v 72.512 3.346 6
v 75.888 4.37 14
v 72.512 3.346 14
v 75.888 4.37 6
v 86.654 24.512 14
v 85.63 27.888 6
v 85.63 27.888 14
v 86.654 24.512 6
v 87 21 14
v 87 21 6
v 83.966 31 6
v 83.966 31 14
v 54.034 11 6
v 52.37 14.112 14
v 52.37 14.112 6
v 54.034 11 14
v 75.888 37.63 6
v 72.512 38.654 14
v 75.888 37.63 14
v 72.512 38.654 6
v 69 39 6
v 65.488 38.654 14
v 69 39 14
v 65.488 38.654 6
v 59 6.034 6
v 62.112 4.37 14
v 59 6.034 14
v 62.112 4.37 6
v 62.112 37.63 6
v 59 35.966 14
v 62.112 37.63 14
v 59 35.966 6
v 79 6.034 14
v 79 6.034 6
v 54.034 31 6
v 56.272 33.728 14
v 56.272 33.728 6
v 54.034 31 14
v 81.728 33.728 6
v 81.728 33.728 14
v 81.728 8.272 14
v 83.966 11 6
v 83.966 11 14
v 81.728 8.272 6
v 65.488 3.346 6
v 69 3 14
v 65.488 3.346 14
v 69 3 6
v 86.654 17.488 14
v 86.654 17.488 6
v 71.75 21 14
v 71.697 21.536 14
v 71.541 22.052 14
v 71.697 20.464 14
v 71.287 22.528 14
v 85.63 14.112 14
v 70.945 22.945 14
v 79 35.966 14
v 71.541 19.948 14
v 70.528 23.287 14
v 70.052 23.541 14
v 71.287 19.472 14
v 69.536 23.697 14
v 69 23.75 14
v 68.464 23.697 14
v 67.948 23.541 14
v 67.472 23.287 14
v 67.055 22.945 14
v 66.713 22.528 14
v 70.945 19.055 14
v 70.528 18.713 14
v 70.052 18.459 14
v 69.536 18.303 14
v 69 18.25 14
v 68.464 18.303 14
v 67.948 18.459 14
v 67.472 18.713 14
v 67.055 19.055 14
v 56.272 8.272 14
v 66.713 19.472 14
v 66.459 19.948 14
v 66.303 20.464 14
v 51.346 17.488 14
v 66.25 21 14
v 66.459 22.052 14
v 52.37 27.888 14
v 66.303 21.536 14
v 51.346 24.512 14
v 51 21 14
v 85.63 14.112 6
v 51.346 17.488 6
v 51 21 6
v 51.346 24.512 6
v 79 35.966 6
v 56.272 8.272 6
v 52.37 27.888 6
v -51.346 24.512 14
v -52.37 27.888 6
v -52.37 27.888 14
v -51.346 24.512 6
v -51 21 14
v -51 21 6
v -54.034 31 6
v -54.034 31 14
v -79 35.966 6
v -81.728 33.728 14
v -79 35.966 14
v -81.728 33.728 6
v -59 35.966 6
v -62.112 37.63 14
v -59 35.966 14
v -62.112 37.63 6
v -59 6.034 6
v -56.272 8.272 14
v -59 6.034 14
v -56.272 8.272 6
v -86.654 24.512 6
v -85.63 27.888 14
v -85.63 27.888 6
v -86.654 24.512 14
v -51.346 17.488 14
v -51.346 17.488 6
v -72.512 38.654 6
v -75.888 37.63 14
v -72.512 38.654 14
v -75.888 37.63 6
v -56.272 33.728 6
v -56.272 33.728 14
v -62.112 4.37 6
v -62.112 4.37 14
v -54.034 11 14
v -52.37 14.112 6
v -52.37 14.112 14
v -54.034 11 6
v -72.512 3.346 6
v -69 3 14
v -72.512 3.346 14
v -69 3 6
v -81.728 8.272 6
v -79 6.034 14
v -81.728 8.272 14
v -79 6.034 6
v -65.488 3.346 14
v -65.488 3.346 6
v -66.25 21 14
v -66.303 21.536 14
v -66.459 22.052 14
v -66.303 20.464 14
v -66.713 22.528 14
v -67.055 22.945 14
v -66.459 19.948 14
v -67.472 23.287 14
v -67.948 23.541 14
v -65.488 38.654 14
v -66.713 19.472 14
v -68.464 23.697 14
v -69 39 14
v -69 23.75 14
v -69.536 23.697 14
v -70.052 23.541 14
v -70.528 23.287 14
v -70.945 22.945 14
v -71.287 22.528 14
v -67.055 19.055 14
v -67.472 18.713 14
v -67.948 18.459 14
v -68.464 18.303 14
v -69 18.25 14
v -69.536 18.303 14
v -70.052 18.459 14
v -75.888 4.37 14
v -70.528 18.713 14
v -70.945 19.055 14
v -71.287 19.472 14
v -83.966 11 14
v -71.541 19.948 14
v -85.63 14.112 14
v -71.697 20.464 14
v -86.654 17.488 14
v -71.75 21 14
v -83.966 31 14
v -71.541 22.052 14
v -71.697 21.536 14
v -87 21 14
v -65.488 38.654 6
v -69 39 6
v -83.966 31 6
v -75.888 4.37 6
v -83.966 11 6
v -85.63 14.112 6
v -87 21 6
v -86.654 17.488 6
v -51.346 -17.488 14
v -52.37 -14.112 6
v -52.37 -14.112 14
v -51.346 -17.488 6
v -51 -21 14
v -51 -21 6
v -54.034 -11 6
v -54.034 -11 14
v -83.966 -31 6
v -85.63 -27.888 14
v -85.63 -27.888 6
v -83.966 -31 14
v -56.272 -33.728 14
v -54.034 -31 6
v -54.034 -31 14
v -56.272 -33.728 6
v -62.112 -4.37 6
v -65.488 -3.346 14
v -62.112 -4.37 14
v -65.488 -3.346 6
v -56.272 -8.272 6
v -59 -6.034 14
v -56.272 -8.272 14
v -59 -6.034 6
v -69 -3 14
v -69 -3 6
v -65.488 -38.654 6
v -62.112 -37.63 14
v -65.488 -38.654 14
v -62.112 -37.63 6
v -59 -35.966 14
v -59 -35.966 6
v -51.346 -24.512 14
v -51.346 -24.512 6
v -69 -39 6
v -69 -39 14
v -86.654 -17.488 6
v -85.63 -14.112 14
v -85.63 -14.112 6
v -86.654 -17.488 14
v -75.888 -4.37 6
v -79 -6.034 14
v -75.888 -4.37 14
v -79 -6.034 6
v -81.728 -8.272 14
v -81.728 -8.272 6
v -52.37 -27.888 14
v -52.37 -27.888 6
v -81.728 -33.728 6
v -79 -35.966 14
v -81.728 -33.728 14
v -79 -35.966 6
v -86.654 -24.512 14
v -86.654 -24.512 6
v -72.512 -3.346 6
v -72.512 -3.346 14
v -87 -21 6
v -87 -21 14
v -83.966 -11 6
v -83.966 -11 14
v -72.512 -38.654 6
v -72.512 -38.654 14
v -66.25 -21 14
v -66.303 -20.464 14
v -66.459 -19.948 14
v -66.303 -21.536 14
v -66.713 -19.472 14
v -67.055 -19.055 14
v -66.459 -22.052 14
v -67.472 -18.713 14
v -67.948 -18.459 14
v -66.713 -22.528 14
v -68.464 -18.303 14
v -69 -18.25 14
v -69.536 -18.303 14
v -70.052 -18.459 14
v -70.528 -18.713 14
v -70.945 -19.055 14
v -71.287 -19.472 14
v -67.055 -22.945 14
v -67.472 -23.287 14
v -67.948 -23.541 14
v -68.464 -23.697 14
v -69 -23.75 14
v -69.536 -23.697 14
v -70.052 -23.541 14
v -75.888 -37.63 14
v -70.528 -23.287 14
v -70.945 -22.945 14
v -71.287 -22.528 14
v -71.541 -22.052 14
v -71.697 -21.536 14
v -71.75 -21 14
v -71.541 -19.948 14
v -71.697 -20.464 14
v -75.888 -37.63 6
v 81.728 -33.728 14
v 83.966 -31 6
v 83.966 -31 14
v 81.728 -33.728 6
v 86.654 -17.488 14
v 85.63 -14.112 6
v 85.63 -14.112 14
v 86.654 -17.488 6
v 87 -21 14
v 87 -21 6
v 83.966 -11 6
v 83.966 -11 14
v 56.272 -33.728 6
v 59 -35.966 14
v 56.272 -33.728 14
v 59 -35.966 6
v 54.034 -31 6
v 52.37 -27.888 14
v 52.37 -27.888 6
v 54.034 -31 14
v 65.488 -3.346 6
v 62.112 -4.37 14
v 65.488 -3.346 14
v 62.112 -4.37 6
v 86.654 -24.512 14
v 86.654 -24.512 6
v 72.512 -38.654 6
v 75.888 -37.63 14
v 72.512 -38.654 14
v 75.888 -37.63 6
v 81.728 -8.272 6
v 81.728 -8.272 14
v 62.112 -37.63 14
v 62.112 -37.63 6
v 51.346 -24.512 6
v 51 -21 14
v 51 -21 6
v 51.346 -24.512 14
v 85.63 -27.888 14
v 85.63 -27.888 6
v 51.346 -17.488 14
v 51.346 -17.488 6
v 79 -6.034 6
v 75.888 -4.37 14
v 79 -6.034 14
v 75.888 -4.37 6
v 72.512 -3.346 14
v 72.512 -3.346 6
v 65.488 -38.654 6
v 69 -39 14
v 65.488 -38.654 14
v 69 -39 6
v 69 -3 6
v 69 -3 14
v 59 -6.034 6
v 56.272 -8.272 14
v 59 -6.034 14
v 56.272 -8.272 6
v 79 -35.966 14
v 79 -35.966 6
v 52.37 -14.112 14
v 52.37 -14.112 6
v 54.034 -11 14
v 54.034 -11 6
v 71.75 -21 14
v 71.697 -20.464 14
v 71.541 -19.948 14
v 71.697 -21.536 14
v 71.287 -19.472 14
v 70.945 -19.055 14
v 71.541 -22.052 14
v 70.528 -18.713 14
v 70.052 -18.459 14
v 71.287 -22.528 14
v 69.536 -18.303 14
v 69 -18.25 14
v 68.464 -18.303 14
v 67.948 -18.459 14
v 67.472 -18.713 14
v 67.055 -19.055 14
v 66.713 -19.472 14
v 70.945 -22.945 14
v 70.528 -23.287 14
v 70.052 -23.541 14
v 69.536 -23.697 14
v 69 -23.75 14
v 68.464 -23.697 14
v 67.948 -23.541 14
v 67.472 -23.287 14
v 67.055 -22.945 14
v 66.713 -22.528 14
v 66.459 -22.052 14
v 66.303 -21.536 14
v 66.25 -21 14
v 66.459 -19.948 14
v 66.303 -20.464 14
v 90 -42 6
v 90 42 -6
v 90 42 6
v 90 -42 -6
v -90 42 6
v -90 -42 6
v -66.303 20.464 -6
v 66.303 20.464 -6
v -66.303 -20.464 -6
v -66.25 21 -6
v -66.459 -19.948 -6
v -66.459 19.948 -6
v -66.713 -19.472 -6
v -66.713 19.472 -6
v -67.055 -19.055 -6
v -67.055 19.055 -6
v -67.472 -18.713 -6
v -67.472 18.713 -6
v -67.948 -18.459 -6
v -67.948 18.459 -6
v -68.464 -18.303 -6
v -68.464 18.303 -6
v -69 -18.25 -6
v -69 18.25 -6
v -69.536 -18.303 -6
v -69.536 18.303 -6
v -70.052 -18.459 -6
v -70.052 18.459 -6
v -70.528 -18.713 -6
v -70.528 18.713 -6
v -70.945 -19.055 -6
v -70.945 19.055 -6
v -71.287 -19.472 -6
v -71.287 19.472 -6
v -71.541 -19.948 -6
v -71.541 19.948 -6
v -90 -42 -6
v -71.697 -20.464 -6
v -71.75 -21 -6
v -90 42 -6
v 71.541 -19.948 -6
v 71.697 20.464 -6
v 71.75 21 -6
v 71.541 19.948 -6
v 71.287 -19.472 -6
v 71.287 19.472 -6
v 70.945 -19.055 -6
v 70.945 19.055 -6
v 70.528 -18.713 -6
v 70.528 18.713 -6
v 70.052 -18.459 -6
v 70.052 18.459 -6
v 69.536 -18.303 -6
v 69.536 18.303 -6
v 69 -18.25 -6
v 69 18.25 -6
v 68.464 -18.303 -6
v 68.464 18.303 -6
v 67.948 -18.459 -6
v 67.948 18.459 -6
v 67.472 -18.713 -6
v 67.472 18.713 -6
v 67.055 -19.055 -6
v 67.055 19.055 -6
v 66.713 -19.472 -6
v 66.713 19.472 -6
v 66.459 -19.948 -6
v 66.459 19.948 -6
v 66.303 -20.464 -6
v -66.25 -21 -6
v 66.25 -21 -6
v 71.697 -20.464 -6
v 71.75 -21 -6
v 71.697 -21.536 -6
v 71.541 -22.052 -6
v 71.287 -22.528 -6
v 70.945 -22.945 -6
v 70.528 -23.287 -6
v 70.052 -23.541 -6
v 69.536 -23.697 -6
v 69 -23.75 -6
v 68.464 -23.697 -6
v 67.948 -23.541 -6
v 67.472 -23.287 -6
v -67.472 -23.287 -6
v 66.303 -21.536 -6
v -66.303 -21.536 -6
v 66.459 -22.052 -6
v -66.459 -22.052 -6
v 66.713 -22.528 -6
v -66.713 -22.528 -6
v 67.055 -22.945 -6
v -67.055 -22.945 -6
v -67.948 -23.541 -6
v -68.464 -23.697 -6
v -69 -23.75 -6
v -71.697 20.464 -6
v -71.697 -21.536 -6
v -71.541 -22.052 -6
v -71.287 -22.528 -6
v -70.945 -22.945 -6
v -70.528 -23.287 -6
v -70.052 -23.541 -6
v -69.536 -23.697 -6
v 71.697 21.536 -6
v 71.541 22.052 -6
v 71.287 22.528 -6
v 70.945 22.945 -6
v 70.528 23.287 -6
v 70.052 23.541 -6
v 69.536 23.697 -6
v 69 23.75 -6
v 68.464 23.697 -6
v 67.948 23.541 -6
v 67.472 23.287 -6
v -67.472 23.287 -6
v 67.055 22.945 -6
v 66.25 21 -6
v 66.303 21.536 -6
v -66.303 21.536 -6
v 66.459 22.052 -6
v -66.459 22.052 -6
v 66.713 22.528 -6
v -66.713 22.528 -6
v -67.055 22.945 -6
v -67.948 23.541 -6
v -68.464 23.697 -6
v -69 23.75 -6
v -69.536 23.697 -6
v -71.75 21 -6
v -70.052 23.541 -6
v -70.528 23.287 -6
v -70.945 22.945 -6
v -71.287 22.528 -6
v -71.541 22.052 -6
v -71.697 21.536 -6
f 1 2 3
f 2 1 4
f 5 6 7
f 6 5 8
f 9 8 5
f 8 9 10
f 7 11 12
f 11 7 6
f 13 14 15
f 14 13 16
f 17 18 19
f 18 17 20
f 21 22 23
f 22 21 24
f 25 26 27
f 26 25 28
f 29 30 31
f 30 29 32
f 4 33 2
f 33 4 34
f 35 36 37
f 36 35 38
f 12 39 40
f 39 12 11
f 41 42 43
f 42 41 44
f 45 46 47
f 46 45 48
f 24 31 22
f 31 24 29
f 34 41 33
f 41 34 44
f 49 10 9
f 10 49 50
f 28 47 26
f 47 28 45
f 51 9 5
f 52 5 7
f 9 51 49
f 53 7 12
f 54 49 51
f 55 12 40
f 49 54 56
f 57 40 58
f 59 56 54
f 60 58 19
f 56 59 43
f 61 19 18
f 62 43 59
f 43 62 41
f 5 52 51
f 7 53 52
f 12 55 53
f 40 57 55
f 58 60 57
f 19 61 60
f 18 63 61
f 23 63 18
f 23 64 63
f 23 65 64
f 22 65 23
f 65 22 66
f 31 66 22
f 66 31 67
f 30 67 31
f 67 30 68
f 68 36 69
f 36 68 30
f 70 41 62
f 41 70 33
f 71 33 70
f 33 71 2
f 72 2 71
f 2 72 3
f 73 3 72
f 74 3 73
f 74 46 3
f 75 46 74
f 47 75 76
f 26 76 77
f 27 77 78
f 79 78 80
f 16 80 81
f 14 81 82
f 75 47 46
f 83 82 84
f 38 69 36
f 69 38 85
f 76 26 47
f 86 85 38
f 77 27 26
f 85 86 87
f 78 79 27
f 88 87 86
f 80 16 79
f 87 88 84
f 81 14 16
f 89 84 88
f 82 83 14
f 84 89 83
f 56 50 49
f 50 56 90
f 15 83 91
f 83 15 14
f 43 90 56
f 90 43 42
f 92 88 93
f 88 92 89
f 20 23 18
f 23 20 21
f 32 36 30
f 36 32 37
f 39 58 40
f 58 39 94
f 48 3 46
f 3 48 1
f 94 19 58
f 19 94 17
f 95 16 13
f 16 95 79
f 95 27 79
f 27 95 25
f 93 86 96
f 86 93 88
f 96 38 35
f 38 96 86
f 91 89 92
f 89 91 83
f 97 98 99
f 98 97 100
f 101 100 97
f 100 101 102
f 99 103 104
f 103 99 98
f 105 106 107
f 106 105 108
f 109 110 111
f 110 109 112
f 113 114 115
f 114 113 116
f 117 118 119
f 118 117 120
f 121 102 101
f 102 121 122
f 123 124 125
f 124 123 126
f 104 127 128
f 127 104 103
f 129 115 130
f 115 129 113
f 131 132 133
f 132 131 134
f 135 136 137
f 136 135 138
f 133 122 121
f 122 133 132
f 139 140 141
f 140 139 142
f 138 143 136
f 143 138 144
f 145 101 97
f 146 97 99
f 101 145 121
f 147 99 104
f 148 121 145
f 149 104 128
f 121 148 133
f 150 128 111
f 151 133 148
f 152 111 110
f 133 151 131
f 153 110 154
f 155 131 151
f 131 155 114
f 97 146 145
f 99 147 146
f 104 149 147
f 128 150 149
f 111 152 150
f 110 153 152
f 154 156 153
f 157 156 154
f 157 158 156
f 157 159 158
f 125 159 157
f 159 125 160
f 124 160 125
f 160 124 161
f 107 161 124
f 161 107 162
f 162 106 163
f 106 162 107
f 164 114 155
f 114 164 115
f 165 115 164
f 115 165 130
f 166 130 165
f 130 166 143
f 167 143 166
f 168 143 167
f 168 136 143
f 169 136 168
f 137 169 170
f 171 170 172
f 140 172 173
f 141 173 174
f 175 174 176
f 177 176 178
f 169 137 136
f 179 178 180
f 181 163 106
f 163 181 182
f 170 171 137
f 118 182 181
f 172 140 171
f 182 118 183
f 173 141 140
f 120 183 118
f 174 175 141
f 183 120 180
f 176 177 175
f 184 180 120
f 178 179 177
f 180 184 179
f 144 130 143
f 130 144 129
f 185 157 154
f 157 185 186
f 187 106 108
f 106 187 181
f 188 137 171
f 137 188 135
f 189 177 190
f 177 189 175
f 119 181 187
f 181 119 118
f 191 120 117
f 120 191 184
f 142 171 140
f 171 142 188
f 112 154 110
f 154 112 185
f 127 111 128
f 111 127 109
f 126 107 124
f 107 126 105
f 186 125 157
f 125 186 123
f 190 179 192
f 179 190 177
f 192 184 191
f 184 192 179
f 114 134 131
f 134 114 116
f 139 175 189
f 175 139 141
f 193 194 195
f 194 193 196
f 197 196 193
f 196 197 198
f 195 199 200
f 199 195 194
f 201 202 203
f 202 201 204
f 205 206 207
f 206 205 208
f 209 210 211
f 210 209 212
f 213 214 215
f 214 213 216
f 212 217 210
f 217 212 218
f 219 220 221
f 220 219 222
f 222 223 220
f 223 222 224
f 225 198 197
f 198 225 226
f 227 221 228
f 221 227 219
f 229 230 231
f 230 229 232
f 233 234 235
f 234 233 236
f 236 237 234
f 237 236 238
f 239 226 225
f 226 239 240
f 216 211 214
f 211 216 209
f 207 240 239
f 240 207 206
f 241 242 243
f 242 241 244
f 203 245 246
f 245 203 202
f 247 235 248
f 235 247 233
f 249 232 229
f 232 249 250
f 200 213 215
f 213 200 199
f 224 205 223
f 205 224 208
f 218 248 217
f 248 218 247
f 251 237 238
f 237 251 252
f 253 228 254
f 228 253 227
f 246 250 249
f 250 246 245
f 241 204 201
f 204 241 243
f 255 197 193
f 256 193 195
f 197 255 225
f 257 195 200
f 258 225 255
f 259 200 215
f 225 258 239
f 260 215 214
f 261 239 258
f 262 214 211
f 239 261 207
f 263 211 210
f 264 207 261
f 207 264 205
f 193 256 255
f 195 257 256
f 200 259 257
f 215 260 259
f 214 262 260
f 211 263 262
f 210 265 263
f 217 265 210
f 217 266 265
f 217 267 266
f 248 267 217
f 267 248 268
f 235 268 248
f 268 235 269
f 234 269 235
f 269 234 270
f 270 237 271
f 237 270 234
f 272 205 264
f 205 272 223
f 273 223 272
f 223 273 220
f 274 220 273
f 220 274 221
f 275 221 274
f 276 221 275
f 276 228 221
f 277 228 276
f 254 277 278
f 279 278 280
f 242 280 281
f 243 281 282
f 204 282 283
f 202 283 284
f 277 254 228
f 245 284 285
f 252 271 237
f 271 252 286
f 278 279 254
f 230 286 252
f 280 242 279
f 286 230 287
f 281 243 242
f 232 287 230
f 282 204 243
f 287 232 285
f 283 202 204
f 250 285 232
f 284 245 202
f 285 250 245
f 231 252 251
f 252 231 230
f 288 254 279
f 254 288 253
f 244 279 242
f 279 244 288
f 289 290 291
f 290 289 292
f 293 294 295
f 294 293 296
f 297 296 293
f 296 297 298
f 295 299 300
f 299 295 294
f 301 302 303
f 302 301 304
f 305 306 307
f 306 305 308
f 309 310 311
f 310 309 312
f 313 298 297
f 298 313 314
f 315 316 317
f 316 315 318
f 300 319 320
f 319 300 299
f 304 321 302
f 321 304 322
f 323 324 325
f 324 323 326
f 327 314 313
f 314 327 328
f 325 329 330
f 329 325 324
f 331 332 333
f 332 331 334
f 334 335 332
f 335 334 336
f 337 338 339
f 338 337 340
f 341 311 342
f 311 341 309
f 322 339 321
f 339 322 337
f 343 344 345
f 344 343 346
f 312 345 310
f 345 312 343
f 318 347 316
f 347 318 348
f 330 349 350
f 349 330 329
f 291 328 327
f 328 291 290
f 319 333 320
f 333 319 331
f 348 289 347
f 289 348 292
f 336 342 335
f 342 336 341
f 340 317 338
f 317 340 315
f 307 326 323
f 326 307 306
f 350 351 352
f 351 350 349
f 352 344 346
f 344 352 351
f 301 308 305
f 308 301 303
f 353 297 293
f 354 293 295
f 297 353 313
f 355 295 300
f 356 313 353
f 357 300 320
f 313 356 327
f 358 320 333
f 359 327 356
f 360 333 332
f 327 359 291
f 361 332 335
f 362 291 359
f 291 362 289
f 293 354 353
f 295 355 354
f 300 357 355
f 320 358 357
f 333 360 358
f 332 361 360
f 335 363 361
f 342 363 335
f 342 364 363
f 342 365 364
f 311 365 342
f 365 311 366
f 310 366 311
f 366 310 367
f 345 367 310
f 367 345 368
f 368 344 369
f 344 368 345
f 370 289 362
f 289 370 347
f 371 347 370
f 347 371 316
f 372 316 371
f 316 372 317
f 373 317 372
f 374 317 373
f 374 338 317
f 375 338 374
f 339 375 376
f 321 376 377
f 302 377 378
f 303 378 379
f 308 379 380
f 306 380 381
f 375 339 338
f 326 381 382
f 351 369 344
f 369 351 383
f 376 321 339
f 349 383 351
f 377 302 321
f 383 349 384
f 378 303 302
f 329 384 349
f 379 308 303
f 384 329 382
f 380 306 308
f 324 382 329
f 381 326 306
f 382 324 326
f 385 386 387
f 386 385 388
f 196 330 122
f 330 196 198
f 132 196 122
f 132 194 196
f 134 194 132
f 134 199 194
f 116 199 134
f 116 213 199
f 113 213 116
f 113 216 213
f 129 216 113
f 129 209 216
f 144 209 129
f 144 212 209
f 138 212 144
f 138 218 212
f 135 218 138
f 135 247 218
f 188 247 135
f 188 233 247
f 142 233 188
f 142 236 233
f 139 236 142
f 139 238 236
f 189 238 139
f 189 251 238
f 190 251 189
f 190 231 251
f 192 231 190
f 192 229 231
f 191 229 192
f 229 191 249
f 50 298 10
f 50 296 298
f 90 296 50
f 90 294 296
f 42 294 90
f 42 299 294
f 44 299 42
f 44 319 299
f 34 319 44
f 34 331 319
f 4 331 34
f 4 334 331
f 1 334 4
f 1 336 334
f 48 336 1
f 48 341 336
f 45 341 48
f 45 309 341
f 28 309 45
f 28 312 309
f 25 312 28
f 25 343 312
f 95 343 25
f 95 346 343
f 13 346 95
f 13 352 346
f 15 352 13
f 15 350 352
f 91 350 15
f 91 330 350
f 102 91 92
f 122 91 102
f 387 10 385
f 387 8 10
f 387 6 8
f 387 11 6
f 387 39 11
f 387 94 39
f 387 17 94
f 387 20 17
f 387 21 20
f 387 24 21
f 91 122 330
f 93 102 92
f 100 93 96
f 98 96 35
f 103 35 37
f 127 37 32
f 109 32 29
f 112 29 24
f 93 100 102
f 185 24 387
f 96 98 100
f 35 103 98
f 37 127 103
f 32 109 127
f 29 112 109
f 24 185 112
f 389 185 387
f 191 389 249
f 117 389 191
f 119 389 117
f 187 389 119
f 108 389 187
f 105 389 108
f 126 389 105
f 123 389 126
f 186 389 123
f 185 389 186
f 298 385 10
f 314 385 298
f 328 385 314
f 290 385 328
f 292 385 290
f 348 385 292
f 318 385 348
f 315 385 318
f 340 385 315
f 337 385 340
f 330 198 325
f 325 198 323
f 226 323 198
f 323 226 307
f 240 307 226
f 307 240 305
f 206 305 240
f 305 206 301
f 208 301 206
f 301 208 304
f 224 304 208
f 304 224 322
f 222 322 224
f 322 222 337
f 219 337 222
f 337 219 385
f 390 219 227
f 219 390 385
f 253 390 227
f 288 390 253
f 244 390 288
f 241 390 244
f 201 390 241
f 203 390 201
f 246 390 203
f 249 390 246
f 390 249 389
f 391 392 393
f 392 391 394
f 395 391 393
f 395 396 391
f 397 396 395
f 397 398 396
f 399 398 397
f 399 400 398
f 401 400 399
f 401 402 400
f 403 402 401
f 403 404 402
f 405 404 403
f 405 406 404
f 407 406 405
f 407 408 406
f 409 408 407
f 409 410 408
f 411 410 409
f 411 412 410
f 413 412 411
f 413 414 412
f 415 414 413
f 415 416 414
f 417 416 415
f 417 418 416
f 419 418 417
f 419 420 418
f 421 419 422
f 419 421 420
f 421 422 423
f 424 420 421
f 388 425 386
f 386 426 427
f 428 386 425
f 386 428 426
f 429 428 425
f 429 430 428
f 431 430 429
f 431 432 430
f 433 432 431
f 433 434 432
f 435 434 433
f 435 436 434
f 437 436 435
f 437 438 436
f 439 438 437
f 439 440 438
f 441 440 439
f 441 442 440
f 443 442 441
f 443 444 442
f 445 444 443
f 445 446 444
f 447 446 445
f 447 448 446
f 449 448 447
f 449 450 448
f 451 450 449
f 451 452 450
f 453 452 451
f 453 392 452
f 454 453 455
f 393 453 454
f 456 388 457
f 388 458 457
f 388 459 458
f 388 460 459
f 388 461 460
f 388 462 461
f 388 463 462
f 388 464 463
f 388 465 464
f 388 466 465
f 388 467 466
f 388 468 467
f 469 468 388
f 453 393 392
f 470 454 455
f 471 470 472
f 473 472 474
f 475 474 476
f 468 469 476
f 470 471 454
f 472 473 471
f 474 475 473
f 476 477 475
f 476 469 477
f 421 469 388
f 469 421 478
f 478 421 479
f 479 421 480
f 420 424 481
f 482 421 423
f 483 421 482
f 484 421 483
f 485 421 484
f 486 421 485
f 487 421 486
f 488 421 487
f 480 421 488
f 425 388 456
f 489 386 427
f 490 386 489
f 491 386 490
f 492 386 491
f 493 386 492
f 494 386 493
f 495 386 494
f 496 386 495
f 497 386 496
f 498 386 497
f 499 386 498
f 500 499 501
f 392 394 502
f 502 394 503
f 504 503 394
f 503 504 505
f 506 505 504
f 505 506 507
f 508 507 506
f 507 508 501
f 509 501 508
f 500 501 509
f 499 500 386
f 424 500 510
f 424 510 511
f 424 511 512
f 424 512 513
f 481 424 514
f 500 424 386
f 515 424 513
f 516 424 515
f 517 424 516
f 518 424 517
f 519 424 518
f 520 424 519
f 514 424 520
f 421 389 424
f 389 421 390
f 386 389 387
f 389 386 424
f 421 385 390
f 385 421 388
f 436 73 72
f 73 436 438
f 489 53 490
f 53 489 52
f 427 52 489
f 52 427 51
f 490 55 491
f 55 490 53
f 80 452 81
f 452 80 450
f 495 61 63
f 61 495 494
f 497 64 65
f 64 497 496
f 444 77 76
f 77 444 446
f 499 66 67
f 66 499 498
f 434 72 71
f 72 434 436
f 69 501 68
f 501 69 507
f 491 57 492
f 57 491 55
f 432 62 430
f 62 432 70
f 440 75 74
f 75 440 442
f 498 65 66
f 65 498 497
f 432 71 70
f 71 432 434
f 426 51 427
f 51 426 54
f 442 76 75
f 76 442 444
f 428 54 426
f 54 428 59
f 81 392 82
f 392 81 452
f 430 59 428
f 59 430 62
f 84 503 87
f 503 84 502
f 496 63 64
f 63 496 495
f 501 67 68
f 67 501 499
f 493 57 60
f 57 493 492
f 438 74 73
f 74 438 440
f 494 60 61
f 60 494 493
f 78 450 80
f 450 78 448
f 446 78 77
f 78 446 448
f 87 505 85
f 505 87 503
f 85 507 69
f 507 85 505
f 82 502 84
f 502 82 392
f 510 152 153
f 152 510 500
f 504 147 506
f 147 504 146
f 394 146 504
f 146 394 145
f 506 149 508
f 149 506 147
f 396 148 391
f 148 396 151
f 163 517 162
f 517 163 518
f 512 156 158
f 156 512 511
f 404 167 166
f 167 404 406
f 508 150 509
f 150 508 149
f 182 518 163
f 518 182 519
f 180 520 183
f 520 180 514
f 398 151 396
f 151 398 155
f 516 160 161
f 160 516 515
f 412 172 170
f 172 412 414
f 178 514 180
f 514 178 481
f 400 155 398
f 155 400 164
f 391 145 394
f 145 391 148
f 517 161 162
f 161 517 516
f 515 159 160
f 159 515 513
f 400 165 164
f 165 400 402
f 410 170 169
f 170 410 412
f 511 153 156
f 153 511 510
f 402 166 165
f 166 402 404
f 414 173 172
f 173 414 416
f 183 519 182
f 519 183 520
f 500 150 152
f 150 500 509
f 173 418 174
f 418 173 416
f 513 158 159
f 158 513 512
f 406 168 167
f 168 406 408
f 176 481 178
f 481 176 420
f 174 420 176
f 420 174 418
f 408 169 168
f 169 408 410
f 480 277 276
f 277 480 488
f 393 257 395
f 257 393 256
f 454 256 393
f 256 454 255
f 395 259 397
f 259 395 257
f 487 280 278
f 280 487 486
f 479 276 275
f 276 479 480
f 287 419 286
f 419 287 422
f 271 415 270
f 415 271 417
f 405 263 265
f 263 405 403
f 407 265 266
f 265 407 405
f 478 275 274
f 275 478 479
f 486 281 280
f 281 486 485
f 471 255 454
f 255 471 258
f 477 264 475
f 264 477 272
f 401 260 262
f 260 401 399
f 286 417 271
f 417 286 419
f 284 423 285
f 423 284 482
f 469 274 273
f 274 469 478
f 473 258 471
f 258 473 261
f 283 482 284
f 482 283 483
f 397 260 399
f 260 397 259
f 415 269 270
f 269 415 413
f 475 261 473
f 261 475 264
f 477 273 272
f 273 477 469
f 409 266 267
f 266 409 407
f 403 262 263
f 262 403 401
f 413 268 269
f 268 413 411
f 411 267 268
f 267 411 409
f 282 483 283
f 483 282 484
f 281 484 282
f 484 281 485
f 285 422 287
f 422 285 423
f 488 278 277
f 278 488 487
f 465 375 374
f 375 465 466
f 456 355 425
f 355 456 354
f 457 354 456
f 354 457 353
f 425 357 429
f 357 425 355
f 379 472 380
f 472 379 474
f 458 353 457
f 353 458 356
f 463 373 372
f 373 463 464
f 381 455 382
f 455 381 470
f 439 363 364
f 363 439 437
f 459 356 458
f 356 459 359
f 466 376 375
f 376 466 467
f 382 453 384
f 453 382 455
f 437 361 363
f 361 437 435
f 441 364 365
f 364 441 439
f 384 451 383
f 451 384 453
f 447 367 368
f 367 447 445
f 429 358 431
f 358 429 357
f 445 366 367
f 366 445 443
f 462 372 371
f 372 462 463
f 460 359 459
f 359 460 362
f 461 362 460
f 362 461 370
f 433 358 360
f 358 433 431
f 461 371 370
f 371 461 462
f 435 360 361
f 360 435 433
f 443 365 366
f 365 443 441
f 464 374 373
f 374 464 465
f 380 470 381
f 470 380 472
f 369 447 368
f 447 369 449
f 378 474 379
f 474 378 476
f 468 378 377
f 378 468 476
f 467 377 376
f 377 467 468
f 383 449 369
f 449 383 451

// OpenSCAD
$fn = 32;

// ----------------------------------------------------------------------
// Anchor pads 180 x 84 x 20
// four corner bosses with anchor holes
// ----------------------------------------------------------------------

// --- parameters (mm) ---
plate = [180, 84, 12];  // base plate size (x, y, z)
pads = 4;               // boss count, one per corner
edge = 21;              // boss centre offset from the plate edge
boss_d = 36;            // boss diameter
boss_h = 8;             // boss height above the base plate
hole_d = 5.5;           // hole diameter

// --- derived feature positions (mm) ---
height = plate[2] + boss_h;      // = 20   overall height of the part
corner_x = plate[0] / 2 - edge;  // = 69   boss centre X
corner_y = plate[1] / 2 - edge;  // = 21   boss centre Y
feature_centers = [
  [corner_x, corner_y],
  [-corner_x, corner_y],
  [-corner_x, -corner_y],
  [corner_x, -corner_y]
];   // boss centres, anchor holes are drilled there

// base plate, four bosses standing on it, anchor holes all the way through
difference() {
  union() {
    cube(plate, center = true);
    for (centre = feature_centers)
      translate([centre[0], centre[1], plate[2] / 2 - 1])
        cylinder(d = boss_d, h = boss_h + 1);
  }
  for (centre = feature_centers)
    translate([centre[0], centre[1], -height])
      cylinder(d = hole_d, h = 2 * height + 2);  // through boss and plate
}
